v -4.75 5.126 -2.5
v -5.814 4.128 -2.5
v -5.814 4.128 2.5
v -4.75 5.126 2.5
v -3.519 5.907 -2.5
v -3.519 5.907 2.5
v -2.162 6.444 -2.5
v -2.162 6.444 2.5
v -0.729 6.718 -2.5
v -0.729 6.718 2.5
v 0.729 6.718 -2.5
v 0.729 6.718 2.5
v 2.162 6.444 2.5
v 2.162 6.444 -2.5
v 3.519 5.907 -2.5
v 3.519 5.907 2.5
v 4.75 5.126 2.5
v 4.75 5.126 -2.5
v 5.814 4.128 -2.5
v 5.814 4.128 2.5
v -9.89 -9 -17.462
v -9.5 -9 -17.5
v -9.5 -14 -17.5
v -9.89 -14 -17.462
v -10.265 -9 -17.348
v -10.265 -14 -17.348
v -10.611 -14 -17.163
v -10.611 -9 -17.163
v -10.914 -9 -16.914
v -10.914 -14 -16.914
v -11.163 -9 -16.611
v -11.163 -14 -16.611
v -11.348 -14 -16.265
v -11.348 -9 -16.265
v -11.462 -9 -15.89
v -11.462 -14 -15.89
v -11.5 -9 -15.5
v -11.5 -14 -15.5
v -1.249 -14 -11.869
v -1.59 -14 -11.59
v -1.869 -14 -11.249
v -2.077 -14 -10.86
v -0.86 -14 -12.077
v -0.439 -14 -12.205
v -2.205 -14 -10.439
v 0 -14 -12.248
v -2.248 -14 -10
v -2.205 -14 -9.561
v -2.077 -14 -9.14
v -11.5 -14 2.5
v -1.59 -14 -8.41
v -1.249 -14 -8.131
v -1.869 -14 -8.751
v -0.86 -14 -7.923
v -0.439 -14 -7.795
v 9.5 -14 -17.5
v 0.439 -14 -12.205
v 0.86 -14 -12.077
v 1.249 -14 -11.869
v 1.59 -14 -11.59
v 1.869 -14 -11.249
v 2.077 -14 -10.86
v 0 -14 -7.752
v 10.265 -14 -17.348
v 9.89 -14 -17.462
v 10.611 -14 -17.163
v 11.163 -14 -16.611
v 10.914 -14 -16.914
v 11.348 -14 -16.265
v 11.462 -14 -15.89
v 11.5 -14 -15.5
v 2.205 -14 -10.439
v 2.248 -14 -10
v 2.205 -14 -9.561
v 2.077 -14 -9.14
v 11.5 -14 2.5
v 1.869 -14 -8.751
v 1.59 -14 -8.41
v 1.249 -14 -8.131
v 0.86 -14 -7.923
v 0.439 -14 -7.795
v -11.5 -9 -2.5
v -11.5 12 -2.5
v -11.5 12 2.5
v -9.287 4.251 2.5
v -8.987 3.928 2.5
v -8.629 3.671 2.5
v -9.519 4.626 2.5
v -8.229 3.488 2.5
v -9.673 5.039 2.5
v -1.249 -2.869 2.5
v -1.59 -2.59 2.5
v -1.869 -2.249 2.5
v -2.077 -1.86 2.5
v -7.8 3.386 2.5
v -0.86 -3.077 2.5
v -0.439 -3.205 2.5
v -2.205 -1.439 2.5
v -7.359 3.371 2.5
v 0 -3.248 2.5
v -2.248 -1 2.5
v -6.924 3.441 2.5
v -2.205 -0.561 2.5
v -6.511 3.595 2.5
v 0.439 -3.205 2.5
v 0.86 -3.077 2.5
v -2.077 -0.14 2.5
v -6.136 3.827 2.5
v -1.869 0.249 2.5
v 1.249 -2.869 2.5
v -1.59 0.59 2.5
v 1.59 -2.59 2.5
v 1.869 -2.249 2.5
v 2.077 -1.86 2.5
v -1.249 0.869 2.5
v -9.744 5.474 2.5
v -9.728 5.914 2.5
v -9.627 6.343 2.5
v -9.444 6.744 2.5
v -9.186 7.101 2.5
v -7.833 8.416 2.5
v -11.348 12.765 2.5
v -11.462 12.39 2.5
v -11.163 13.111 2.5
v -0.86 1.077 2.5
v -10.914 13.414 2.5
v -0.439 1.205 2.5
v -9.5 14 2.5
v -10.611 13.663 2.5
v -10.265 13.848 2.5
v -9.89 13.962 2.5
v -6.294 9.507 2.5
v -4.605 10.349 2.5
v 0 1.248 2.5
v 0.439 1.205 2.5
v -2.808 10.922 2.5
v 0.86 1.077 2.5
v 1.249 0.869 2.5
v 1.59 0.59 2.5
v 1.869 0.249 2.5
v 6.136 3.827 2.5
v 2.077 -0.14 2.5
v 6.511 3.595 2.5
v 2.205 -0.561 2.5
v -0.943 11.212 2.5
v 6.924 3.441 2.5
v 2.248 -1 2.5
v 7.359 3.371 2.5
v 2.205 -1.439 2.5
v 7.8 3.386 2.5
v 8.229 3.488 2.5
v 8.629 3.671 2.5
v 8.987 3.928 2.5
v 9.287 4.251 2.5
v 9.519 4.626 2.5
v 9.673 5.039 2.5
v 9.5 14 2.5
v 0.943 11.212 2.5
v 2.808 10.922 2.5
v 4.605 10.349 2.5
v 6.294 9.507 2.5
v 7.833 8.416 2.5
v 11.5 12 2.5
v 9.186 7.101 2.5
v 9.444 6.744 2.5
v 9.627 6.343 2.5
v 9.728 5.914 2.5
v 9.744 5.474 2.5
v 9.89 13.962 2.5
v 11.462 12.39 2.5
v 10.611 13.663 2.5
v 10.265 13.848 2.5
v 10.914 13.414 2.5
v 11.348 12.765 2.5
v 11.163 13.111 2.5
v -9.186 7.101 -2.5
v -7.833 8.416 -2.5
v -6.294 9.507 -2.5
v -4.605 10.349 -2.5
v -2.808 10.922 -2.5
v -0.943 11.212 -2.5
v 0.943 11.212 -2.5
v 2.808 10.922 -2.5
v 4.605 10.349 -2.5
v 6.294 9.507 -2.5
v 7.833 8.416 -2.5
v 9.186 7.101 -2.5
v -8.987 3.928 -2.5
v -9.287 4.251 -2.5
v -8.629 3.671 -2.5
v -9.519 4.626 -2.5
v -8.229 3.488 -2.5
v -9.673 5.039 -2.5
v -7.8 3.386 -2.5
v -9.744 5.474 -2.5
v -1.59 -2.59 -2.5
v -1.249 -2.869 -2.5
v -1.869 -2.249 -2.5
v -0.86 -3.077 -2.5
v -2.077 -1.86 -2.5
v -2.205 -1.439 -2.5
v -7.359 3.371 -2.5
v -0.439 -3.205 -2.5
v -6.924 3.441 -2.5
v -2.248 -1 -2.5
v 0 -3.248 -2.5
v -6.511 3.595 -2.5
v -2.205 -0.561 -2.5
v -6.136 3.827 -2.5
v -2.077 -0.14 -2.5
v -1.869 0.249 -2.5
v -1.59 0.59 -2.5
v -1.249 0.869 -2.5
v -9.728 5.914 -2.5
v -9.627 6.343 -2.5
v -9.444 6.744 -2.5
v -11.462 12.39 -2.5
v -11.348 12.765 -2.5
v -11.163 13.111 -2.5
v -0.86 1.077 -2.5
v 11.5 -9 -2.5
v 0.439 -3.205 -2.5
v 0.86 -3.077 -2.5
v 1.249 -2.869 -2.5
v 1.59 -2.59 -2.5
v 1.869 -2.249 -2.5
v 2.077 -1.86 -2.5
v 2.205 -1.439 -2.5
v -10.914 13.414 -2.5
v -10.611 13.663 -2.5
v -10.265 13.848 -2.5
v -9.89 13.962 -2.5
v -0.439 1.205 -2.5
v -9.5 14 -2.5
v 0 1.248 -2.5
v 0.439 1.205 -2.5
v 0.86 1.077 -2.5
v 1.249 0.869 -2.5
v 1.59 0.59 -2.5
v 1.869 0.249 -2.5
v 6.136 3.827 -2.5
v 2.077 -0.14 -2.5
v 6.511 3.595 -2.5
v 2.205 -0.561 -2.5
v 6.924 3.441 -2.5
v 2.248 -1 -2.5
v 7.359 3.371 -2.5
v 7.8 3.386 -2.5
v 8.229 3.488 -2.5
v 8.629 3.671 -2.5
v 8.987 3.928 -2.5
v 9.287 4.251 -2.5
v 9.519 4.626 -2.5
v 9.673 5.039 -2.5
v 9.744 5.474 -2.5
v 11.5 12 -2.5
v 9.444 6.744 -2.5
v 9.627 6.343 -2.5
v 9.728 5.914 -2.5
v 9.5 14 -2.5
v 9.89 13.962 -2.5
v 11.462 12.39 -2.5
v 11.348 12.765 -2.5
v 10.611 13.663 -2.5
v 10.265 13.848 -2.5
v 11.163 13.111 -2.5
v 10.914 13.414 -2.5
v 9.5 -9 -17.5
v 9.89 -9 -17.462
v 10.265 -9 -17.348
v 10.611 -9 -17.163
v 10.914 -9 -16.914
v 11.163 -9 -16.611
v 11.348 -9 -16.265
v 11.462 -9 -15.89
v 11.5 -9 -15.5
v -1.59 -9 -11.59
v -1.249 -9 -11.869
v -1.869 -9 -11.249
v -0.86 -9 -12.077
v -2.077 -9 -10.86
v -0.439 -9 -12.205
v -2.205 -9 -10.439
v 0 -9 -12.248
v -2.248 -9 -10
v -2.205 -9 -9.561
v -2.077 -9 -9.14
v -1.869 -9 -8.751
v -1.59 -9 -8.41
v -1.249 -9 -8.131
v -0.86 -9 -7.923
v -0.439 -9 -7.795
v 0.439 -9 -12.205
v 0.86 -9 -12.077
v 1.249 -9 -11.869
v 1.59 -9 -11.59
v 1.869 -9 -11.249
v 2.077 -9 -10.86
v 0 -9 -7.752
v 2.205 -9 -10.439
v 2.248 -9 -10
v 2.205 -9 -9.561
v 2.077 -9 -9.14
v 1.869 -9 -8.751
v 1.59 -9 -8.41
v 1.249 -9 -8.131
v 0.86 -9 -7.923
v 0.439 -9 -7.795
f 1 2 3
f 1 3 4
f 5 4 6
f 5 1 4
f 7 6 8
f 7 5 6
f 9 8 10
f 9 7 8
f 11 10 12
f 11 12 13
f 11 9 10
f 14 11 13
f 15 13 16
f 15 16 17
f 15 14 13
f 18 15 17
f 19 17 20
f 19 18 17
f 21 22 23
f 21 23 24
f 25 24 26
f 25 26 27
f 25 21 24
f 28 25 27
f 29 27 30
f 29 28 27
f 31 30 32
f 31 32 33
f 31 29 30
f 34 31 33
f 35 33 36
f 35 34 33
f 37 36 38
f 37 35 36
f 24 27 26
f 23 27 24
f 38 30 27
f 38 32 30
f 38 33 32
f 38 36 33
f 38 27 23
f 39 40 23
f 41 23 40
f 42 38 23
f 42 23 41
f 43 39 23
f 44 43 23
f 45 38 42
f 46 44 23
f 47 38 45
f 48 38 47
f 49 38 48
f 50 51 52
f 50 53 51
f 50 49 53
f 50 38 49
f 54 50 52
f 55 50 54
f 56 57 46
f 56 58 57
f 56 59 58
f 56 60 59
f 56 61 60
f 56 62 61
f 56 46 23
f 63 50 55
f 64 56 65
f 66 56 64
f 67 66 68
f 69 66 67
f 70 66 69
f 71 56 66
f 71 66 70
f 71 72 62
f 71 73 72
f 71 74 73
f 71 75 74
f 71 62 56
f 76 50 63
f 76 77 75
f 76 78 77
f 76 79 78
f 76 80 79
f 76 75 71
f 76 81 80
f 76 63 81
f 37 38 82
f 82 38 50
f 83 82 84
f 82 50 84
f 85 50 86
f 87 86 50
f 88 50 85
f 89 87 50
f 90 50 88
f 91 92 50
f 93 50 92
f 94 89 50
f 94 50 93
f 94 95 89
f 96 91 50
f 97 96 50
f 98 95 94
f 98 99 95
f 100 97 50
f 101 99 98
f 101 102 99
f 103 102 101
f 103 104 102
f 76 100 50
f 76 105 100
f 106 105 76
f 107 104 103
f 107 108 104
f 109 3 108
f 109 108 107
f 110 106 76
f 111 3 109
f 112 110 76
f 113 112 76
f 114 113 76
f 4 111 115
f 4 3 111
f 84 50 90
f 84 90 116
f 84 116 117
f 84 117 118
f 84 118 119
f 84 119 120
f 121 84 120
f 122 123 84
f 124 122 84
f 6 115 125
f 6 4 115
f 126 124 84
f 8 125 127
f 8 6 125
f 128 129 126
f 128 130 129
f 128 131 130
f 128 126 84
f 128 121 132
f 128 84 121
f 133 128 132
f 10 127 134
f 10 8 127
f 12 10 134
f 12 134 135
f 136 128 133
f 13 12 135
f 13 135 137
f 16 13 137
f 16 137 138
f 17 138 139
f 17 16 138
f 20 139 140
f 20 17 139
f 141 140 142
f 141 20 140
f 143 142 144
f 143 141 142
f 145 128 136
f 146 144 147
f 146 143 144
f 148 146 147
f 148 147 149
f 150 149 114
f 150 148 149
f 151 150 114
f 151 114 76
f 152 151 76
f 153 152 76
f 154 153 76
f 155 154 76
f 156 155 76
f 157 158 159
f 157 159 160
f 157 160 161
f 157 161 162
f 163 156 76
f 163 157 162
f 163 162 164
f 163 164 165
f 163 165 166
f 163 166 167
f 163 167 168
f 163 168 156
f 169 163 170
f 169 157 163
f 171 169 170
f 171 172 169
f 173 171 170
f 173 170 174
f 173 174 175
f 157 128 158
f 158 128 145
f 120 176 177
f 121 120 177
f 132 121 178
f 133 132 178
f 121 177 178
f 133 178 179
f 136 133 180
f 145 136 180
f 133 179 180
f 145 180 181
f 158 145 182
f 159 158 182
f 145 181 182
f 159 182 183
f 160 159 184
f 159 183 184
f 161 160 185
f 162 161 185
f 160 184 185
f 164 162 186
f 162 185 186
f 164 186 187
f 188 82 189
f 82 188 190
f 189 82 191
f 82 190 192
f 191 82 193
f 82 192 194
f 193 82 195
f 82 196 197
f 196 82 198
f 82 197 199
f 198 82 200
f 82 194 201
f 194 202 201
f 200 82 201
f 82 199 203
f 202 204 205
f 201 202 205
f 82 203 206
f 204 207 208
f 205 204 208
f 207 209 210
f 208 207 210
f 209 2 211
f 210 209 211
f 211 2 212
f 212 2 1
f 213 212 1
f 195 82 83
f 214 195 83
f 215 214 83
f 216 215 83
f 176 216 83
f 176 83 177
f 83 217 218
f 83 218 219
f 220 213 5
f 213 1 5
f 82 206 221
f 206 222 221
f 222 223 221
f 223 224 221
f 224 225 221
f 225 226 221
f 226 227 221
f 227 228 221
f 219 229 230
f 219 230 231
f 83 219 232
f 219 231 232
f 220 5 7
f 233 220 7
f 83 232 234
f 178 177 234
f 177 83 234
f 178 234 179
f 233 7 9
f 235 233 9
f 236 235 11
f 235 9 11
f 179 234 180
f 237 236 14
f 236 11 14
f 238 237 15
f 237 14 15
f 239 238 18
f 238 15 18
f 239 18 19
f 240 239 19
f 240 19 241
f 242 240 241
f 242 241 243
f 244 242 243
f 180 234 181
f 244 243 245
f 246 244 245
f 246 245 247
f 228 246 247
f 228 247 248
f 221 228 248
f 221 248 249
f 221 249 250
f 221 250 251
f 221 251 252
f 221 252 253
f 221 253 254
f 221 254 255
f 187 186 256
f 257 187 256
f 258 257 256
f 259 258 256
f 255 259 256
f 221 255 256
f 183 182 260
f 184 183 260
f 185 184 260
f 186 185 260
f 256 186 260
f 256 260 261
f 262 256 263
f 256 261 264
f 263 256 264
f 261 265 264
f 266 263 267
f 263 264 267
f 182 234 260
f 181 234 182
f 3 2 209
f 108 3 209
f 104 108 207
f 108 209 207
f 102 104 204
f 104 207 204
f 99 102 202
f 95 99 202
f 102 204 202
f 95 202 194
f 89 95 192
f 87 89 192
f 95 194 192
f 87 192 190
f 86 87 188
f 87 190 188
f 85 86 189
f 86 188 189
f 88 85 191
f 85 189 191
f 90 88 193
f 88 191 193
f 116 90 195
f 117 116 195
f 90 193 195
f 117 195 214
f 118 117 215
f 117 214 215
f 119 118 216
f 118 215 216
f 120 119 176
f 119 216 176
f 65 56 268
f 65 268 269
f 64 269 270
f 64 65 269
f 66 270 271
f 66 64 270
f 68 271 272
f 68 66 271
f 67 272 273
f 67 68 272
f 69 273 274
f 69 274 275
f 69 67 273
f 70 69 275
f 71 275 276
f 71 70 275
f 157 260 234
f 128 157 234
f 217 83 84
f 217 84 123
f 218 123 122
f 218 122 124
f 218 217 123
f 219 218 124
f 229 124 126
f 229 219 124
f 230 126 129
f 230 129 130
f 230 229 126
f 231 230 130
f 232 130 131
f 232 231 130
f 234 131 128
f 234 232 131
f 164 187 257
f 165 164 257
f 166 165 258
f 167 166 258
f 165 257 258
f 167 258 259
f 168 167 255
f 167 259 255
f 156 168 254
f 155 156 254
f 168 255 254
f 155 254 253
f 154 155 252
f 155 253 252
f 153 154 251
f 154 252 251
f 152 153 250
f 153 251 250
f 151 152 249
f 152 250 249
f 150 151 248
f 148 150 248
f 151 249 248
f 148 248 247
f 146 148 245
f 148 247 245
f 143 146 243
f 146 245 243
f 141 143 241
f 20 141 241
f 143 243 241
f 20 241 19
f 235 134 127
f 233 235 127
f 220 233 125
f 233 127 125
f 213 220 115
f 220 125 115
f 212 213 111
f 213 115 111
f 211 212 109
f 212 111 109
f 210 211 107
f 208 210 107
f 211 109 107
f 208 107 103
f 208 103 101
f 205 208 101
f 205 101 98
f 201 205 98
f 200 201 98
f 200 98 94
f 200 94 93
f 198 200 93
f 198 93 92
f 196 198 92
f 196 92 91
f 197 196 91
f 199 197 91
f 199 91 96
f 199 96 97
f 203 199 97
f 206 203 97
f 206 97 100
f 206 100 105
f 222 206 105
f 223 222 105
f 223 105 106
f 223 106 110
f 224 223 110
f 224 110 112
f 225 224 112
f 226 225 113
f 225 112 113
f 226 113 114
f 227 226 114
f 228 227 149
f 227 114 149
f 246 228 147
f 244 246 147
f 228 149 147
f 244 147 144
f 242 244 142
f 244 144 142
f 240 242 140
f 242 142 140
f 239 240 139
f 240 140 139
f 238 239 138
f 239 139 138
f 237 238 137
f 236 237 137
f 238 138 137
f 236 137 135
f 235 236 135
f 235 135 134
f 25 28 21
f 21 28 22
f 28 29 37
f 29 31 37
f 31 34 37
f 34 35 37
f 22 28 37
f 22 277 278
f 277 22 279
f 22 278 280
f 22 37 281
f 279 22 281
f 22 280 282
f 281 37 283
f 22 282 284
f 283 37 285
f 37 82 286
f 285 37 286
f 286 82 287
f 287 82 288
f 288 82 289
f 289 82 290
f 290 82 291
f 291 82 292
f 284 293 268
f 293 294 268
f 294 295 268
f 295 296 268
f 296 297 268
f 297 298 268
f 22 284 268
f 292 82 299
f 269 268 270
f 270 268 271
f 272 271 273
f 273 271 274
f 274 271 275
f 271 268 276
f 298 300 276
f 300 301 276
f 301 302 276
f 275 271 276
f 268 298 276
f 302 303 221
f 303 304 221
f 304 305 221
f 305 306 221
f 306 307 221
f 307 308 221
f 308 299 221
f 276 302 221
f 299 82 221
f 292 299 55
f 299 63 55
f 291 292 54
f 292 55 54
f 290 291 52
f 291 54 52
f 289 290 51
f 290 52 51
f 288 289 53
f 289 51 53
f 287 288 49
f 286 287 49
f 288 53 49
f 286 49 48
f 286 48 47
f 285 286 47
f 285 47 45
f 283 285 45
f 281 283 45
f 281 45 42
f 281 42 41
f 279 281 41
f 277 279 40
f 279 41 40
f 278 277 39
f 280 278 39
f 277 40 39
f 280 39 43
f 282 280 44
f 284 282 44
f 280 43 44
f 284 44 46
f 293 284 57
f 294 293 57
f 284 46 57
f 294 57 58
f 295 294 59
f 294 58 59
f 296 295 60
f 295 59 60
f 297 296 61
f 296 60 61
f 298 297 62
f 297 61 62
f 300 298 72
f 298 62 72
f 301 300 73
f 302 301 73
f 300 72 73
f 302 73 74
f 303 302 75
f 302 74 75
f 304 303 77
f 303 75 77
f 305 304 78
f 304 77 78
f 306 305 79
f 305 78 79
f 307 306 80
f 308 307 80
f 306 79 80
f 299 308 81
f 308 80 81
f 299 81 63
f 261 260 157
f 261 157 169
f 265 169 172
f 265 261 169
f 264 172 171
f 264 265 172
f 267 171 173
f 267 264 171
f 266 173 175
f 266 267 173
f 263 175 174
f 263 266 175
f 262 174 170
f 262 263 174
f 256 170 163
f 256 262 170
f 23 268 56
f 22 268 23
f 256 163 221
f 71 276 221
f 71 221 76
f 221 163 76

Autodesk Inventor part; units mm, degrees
ref_plane "YZ Plane" through (0, 0, 0) normal (1, 0, 0) x (0, 1, 0)
ref_plane "XZ Plane" through (0, 0, 0) normal (0, 1, 0) x (-1, 0, 0)
ref_plane "XY Plane" through (0, 0, 0) normal (0, 0, 1) x (1, 0, 0)
sketch "Sketch1" plane through (0, 0, 0) normal (0, 0, 1) x (1, 0, 0)
  line L0 (-11.5, -14) -> (11.5, -14)
  line L1 (11.5, -14) -> (11.5, 14)
  line L2 (11.5, 14) -> (-11.5, 14)
  line L3 (-11.5, 14) -> (-11.5, -14)
  line L4 (-11.5, -14) -> (11.5, 14) construction
  line L5 (11.5, -14) -> (-11.5, 14) construction
  point P0 (0, 0)
  dimension "d0" = 23
  dimension "d1" = 28
extrude "Extrusion1" add sketch "Sketch1" along normal mid plane 5
sketch "Sketch2" plane through (0, 0, -2.5) normal (0, 0, -1) x (-1, 0, 0)
  line L0 (11.5, -14) -> (-11.5, -14) projected
  line L1 (-11.5, -14) -> (11.5, -14)
  line L2 (11.5, -14) -> (11.5, -9)
  line L3 (11.5, -9) -> (-11.5, -9)
  line L4 (-11.5, -9) -> (-11.5, -14)
  line L5 (11.5, -14) -> (11.5, 14) projected
  point P0 (0, 0)
  dimension "d4" = 5
extrude "Extrusion2" add sketch "Sketch2" along normal blind 15
sketch "Sketch3" plane through (-11.5, -9, -2.5) normal (0, 1, 0) x (1, 0, 0)
  line L0 (0, 0) -> (0, 15) projected
  line L1 (0, 15) -> (23, 15) projected
  point P0 (11.5, -2.5)
  point P1 (11.5, 7.5)
  point P2 (0, 7.5)
  point P3 (11.5, 15)
hole "Hole1" at (0, -9, -10) direction (0, -1, 0) diameter 4.496 end through all clearance for "Flat Head Machine Screw (82)" size "#8" standard "Ansi Unified Screw Threads"
sketch "Sketch4" plane through (0, 0, -2.5) normal (0, 0, -1) x (-1, 0, 0)
  line L0 (11.5, 14) -> (-11.5, 14) projected
  line L1 (11.5, -9) -> (-11.5, -9) projected
  point P0 (0, 0)
  point P1 (0, -1)
  point P2 (0, 14)
  dimension "d14" = 8
hole "Hole2" at (0, -1, -2.5) direction (0, 0, 1) diameter 4.496 end through all clearance for "Flat Head Machine Screw (82)" size "#8" standard "Ansi Unified Screw Threads"
sketch "Sketch5" plane through (0, 0, -2.5) normal (0, 0, -1) x (-1, 0, 0)
  circle A0 centre (0, -1) radius 10 construction
  arc A1 (-9.186, 7.1013) -> (-5.814, 4.1275) centre (-7.5, 5.6144) ccw
  arc A2 (5.814, 4.1275) -> (9.186, 7.1013) centre (7.5, 5.6144) ccw
  arc A3 (9.186, 7.1013) -> (-9.186, 7.1013) centre (0, -1) ccw
  arc A4 (5.814, 4.1275) -> (-5.814, 4.1275) centre (0, -1) ccw
  line L0 (-7.5, 5.6144) -> (7.5, 5.6144) construction
  line L1 (-11.5, 14) -> (-11.5, -9) construction
  circle A5 centre (0, -1) radius 2.248 projected
  point P0 (0, 5.6144)
  dimension "d22" = 20
  dimension "d23" = 4.496
  dimension "d24" = 4
extrude "Extrusion3" cut sketch "Sketch5" against normal through all contours A3 A2 A4 A1
fillet "Fillet1" radius 2 4 edges at (11.5, 14, 0) (-11.5, 14, 0) (11.5, -11.5, -17.5) (-11.5, -11.5, -17.5)
properties part number "RotateLBracket"
